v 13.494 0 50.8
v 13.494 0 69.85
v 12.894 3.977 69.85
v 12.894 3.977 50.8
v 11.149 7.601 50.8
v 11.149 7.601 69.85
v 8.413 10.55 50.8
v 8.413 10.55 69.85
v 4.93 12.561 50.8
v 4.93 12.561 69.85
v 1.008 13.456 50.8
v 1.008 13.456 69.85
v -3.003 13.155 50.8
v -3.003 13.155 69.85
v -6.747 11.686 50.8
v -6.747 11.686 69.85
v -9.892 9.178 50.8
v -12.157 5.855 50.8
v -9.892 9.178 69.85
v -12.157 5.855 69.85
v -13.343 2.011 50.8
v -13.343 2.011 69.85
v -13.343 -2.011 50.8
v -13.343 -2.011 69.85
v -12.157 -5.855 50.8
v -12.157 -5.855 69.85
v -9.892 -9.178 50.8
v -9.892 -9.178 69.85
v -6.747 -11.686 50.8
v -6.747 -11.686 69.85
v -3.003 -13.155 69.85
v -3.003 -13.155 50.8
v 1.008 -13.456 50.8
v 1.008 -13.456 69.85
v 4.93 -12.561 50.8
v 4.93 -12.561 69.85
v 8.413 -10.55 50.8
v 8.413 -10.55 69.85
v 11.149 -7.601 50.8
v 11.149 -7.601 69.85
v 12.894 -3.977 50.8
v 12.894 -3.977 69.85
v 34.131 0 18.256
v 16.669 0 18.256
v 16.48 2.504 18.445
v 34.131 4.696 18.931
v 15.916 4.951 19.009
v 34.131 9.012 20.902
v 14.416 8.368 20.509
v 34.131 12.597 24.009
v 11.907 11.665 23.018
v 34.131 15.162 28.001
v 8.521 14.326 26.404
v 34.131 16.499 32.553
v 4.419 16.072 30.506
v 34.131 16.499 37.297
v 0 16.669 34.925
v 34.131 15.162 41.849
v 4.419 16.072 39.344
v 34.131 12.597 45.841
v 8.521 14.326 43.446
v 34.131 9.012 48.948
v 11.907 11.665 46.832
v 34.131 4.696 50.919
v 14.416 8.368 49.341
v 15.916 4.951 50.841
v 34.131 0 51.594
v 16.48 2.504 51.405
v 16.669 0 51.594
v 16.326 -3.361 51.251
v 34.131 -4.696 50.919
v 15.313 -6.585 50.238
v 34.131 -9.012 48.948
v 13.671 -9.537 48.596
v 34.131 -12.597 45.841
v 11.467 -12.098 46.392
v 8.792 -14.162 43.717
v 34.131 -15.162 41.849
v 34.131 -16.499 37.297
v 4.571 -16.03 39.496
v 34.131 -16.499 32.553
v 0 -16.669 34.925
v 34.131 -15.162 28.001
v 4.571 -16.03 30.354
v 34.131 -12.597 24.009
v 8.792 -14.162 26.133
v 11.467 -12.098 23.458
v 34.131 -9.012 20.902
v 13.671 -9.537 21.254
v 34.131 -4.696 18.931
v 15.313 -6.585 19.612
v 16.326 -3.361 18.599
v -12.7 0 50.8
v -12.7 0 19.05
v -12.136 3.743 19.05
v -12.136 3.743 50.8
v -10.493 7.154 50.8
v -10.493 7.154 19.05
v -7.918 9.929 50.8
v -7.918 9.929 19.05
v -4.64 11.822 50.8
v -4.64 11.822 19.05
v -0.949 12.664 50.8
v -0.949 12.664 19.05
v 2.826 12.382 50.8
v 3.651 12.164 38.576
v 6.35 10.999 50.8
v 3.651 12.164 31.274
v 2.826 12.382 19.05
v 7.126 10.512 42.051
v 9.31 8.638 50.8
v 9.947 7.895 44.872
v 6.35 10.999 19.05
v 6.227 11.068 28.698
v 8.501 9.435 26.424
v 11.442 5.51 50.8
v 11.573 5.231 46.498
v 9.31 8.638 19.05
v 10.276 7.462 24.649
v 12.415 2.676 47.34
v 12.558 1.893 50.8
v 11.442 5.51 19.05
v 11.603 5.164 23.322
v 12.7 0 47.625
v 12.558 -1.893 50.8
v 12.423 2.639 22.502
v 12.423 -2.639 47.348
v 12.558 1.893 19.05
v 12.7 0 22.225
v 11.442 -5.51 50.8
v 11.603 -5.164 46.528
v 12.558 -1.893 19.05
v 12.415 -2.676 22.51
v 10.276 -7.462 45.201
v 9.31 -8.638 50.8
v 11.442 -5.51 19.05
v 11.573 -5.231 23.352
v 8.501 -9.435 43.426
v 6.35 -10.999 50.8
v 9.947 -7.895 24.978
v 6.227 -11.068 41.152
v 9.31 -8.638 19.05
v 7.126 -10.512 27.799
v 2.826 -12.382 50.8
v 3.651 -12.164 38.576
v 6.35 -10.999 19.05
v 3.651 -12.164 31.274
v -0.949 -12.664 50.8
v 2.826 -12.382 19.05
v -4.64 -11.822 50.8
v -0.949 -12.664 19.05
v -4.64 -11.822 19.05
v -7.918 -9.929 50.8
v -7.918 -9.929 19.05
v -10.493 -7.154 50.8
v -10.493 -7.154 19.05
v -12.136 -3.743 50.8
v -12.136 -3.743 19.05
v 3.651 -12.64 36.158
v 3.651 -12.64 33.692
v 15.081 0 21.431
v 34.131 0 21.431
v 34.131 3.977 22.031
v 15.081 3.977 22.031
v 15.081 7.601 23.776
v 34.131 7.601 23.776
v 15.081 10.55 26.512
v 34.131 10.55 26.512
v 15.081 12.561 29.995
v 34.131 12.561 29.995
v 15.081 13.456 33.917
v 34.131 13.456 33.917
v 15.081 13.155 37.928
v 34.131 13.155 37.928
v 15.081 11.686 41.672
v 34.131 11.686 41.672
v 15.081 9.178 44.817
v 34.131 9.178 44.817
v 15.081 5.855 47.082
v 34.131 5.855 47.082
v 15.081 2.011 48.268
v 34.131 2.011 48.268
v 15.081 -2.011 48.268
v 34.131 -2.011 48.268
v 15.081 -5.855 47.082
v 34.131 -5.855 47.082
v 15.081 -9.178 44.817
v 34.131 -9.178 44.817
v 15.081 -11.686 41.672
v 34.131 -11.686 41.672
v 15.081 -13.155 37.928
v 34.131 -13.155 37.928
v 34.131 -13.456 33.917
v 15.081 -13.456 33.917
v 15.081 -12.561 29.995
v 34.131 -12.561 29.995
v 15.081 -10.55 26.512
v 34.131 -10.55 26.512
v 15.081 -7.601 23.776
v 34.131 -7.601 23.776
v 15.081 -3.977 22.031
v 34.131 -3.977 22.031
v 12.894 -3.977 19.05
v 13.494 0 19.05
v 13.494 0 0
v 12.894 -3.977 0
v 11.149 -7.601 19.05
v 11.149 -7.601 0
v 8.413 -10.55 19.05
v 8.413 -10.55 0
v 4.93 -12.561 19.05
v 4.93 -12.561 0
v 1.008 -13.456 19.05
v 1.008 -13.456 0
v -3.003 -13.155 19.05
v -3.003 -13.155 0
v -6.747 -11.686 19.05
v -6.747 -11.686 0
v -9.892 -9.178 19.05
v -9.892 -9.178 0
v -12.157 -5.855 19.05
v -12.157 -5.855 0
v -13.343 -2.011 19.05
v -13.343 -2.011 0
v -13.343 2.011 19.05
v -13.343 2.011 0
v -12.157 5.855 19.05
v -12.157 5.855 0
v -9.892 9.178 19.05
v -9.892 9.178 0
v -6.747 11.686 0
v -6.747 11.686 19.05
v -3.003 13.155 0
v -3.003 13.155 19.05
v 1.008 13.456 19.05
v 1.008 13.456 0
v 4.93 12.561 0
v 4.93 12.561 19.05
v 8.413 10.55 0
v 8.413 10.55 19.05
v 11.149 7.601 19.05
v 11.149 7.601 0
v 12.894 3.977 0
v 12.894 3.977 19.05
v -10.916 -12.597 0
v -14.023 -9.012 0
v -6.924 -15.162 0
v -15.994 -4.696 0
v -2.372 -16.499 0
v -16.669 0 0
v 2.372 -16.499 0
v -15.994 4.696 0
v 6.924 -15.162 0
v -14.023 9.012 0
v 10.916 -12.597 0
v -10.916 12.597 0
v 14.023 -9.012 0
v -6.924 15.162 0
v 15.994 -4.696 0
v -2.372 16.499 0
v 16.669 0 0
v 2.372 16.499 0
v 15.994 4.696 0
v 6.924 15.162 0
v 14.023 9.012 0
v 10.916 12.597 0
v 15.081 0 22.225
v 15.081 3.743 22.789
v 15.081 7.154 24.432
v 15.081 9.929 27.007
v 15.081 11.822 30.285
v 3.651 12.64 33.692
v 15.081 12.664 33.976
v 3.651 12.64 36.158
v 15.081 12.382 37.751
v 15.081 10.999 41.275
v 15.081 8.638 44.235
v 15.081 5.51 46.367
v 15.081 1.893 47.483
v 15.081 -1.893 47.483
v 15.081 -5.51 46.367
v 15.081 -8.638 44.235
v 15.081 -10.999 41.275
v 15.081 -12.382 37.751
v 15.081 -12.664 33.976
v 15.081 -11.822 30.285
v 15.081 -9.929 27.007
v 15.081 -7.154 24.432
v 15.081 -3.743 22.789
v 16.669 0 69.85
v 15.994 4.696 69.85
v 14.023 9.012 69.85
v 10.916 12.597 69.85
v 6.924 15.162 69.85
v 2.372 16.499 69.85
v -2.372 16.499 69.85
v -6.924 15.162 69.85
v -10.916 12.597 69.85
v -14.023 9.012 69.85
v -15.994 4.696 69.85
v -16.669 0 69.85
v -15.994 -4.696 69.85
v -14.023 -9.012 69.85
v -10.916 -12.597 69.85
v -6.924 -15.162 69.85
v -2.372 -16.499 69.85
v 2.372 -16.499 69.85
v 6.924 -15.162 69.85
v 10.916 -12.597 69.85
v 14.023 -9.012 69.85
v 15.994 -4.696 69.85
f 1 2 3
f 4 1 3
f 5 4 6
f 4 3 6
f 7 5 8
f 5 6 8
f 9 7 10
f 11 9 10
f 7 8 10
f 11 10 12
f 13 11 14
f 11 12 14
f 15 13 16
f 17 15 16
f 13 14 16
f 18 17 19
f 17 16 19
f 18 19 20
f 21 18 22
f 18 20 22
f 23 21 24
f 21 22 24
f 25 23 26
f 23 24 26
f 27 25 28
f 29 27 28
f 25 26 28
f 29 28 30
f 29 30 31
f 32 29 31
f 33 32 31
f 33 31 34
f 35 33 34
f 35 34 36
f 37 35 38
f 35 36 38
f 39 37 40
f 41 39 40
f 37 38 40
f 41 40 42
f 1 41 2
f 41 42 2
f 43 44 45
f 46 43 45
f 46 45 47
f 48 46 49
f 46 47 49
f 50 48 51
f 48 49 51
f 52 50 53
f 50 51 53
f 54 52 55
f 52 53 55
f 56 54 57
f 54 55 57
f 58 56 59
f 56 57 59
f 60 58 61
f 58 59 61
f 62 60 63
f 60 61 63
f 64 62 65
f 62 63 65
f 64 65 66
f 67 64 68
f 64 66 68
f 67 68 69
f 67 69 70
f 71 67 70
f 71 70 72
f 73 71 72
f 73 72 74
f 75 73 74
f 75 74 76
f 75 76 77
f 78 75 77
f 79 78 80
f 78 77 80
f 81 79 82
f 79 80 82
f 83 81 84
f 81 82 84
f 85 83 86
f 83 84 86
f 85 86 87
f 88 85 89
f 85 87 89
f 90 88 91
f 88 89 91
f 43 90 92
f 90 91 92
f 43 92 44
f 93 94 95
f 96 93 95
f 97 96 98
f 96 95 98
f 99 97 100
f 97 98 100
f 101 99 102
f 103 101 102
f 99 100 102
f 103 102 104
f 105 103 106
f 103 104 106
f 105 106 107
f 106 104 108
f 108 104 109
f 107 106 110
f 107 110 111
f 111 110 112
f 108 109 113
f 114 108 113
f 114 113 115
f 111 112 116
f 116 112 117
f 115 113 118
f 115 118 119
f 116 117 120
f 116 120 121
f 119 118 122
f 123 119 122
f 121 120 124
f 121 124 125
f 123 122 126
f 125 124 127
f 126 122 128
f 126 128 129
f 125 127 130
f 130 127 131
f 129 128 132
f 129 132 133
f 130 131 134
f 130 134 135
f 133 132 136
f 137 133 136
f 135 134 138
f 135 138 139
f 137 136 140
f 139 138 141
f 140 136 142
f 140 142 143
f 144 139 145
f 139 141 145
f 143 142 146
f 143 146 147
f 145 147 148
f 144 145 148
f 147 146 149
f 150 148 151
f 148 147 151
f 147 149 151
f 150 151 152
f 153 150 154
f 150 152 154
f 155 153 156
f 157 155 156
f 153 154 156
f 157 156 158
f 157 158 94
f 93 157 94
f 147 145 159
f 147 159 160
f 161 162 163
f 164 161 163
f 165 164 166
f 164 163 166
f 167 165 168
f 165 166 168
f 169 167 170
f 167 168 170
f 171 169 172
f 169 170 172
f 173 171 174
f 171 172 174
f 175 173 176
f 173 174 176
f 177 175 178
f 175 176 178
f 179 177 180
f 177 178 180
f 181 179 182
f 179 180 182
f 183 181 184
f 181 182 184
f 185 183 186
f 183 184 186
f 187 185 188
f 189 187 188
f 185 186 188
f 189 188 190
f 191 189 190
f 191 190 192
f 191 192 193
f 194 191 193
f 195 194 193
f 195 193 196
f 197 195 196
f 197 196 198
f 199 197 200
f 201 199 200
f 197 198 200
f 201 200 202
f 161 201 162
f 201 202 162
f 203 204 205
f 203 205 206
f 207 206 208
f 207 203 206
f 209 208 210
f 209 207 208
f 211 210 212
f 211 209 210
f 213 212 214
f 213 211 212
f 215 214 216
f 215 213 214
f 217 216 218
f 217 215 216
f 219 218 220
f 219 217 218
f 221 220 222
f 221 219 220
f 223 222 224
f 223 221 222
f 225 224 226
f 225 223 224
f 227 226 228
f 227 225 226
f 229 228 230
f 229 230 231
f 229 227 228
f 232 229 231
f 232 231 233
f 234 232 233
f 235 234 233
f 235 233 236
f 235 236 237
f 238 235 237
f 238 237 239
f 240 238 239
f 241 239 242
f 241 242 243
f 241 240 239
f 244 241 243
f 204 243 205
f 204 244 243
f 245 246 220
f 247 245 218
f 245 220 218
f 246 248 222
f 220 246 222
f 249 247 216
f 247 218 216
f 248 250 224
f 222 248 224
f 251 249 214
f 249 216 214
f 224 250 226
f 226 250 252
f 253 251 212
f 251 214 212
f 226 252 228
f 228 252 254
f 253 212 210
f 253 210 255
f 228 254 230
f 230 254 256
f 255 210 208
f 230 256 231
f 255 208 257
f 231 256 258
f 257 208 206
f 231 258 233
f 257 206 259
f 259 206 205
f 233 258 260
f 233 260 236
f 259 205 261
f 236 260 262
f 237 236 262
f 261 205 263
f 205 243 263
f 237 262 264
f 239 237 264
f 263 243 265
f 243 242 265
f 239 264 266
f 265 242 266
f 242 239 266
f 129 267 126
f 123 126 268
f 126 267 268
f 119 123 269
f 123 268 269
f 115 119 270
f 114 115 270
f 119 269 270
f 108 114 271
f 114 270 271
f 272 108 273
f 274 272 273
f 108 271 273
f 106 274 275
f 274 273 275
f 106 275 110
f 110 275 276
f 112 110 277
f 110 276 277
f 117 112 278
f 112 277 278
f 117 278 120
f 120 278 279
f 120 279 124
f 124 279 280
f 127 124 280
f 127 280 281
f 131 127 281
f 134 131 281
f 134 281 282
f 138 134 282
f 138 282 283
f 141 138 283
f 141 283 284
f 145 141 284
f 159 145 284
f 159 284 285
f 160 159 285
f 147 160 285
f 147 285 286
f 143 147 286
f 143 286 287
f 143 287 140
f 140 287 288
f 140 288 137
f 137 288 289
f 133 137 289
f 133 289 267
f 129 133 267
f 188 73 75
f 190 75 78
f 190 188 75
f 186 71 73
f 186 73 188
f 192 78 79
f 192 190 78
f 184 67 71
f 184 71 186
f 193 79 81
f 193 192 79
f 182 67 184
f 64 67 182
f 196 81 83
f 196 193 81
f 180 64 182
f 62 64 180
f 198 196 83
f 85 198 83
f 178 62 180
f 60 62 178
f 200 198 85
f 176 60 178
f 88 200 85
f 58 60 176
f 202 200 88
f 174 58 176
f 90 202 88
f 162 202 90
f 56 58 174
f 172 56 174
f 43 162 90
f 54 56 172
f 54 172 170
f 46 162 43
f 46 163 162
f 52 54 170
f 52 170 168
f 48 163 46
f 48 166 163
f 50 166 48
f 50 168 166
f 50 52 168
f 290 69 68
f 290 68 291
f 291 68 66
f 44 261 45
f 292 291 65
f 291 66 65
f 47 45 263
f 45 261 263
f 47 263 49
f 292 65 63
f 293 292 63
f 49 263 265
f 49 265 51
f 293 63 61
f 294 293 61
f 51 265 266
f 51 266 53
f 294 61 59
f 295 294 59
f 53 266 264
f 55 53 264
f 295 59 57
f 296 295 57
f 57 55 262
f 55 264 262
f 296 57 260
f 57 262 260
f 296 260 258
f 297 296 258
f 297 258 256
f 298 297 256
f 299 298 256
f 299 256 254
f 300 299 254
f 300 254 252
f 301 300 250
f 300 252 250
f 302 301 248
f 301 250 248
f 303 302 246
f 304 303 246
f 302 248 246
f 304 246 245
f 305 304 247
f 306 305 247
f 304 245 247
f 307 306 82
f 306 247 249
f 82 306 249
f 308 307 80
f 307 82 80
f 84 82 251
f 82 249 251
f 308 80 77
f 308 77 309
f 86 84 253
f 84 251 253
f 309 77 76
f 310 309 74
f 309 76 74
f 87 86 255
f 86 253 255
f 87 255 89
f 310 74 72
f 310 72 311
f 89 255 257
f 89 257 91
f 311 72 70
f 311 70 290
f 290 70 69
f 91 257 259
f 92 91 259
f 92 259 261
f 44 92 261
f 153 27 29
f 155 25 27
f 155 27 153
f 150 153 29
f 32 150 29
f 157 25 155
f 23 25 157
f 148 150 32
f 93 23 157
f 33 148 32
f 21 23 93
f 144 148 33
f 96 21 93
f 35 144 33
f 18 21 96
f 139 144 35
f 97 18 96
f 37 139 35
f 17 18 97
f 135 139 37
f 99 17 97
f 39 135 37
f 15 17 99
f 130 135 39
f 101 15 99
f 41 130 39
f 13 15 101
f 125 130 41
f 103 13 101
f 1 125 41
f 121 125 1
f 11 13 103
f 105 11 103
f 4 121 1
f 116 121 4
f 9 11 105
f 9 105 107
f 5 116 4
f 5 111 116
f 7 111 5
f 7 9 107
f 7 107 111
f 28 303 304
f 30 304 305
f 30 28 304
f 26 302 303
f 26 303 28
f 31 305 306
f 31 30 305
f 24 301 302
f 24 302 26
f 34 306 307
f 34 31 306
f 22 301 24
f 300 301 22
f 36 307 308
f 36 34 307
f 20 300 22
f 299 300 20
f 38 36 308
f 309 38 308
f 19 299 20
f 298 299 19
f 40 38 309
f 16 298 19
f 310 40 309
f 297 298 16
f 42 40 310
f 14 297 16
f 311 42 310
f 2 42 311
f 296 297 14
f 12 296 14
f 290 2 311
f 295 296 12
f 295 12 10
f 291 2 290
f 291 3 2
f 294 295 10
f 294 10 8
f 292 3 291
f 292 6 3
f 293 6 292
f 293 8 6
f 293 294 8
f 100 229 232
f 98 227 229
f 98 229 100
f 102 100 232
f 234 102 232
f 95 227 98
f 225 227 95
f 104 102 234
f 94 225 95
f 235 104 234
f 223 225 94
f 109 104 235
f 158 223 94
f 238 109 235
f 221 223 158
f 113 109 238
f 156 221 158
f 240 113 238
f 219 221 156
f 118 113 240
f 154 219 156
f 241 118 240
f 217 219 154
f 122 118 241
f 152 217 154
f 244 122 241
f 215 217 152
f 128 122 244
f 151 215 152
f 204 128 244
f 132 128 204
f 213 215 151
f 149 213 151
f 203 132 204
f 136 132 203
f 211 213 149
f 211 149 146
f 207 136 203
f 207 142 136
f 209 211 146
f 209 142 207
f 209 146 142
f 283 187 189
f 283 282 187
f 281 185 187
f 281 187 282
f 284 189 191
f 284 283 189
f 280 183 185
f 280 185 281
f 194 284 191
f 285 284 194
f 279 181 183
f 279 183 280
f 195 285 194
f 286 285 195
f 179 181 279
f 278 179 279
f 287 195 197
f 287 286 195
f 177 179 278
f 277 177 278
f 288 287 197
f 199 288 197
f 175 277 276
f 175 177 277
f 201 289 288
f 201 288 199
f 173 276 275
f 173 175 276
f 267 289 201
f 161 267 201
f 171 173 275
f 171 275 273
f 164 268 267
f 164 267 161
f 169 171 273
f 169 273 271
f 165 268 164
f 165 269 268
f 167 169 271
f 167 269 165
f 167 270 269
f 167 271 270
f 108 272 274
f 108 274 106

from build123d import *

# Parameters (mm, degrees)
SKETCH1_R           = 16.66875
BOSS_EXTRUDE1_DEPTH = 69.85
SKETCH2_R           = 16.66875
BOSS_EXTRUDE2_DEPTH = 34.13125
SKETCH3_R           = 12.7
CUT_EXTRUDE1_DEPTH  = 30.48
SKETCH5_R           = 12.7
CUT_EXTRUDE3_DEPTH  = 80.509822998
SKETCH7_R           = 13.49375
CUT_EXTRUDE4_DEPTH  = 19.05
SKETCH8_R           = 13.49375
CUT_EXTRUDE5_DEPTH  = 19.05
CUT_EXTRUDE6_START  = -19.05
SKETCH9_R           = 13.49375
CUT_EXTRUDE6_DEPTH  = 19.05


with BuildPart() as part:
    # Sketch1 → Boss-Extrude1 (new body)
    with BuildSketch(Plane.XY):
        Circle(SKETCH1_R)
    extrude(amount=BOSS_EXTRUDE1_DEPTH)

    # Sketch2 → Boss-Extrude2 (add)
    with BuildSketch(Plane(origin=(0, 0, 0), x_dir=(0, 0, -1), z_dir=(1, 0, 0))):
        with Locations((-34.925, 0)):
            Circle(SKETCH2_R)
    extrude(amount=BOSS_EXTRUDE2_DEPTH)

    # Sketch3 → Cut-Extrude1 (cut)
    with BuildSketch(Plane(origin=(34.13125, 0, 0), x_dir=(0, 0, -1), z_dir=(1, 0, 0))):
        with Locations((-34.925, 0)):
            Circle(SKETCH3_R)
    extrude(amount=-CUT_EXTRUDE1_DEPTH, mode=Mode.SUBTRACT)

    # Sketch5 → Cut-Extrude3 (cut, through all)
    with BuildSketch(Plane(origin=(0, 0, 0), x_dir=(-1, 0, 0), z_dir=(0, 0, -1))):
        Circle(SKETCH5_R)
    extrude(amount=-CUT_EXTRUDE3_DEPTH, mode=Mode.SUBTRACT)

    # Sketch7 → Cut-Extrude4 (cut)
    with BuildSketch(Plane.XY.offset(69.85)):
        Circle(SKETCH7_R)
    extrude(amount=-CUT_EXTRUDE4_DEPTH, mode=Mode.SUBTRACT)

    # Sketch8 → Cut-Extrude5 (cut)
    with BuildSketch(Plane(origin=(34.13125, 0, 0), x_dir=(0, 0, -1), z_dir=(1, 0, 0))):
        with Locations((-34.925, 0)):
            Circle(SKETCH8_R)
    extrude(amount=-CUT_EXTRUDE5_DEPTH, mode=Mode.SUBTRACT)

    # Sketch9 → Cut-Extrude6 (cut)
    with BuildSketch(Plane(origin=(0, 0, 0), x_dir=(-1, 0, 0), z_dir=(0, 0, -1)).offset(CUT_EXTRUDE6_START)):
        with Locations(Location((0, 0, 0), (0, 0, 180))):
            Circle(SKETCH9_R)
    extrude(amount=CUT_EXTRUDE6_DEPTH, mode=Mode.SUBTRACT)


solid = part.part
